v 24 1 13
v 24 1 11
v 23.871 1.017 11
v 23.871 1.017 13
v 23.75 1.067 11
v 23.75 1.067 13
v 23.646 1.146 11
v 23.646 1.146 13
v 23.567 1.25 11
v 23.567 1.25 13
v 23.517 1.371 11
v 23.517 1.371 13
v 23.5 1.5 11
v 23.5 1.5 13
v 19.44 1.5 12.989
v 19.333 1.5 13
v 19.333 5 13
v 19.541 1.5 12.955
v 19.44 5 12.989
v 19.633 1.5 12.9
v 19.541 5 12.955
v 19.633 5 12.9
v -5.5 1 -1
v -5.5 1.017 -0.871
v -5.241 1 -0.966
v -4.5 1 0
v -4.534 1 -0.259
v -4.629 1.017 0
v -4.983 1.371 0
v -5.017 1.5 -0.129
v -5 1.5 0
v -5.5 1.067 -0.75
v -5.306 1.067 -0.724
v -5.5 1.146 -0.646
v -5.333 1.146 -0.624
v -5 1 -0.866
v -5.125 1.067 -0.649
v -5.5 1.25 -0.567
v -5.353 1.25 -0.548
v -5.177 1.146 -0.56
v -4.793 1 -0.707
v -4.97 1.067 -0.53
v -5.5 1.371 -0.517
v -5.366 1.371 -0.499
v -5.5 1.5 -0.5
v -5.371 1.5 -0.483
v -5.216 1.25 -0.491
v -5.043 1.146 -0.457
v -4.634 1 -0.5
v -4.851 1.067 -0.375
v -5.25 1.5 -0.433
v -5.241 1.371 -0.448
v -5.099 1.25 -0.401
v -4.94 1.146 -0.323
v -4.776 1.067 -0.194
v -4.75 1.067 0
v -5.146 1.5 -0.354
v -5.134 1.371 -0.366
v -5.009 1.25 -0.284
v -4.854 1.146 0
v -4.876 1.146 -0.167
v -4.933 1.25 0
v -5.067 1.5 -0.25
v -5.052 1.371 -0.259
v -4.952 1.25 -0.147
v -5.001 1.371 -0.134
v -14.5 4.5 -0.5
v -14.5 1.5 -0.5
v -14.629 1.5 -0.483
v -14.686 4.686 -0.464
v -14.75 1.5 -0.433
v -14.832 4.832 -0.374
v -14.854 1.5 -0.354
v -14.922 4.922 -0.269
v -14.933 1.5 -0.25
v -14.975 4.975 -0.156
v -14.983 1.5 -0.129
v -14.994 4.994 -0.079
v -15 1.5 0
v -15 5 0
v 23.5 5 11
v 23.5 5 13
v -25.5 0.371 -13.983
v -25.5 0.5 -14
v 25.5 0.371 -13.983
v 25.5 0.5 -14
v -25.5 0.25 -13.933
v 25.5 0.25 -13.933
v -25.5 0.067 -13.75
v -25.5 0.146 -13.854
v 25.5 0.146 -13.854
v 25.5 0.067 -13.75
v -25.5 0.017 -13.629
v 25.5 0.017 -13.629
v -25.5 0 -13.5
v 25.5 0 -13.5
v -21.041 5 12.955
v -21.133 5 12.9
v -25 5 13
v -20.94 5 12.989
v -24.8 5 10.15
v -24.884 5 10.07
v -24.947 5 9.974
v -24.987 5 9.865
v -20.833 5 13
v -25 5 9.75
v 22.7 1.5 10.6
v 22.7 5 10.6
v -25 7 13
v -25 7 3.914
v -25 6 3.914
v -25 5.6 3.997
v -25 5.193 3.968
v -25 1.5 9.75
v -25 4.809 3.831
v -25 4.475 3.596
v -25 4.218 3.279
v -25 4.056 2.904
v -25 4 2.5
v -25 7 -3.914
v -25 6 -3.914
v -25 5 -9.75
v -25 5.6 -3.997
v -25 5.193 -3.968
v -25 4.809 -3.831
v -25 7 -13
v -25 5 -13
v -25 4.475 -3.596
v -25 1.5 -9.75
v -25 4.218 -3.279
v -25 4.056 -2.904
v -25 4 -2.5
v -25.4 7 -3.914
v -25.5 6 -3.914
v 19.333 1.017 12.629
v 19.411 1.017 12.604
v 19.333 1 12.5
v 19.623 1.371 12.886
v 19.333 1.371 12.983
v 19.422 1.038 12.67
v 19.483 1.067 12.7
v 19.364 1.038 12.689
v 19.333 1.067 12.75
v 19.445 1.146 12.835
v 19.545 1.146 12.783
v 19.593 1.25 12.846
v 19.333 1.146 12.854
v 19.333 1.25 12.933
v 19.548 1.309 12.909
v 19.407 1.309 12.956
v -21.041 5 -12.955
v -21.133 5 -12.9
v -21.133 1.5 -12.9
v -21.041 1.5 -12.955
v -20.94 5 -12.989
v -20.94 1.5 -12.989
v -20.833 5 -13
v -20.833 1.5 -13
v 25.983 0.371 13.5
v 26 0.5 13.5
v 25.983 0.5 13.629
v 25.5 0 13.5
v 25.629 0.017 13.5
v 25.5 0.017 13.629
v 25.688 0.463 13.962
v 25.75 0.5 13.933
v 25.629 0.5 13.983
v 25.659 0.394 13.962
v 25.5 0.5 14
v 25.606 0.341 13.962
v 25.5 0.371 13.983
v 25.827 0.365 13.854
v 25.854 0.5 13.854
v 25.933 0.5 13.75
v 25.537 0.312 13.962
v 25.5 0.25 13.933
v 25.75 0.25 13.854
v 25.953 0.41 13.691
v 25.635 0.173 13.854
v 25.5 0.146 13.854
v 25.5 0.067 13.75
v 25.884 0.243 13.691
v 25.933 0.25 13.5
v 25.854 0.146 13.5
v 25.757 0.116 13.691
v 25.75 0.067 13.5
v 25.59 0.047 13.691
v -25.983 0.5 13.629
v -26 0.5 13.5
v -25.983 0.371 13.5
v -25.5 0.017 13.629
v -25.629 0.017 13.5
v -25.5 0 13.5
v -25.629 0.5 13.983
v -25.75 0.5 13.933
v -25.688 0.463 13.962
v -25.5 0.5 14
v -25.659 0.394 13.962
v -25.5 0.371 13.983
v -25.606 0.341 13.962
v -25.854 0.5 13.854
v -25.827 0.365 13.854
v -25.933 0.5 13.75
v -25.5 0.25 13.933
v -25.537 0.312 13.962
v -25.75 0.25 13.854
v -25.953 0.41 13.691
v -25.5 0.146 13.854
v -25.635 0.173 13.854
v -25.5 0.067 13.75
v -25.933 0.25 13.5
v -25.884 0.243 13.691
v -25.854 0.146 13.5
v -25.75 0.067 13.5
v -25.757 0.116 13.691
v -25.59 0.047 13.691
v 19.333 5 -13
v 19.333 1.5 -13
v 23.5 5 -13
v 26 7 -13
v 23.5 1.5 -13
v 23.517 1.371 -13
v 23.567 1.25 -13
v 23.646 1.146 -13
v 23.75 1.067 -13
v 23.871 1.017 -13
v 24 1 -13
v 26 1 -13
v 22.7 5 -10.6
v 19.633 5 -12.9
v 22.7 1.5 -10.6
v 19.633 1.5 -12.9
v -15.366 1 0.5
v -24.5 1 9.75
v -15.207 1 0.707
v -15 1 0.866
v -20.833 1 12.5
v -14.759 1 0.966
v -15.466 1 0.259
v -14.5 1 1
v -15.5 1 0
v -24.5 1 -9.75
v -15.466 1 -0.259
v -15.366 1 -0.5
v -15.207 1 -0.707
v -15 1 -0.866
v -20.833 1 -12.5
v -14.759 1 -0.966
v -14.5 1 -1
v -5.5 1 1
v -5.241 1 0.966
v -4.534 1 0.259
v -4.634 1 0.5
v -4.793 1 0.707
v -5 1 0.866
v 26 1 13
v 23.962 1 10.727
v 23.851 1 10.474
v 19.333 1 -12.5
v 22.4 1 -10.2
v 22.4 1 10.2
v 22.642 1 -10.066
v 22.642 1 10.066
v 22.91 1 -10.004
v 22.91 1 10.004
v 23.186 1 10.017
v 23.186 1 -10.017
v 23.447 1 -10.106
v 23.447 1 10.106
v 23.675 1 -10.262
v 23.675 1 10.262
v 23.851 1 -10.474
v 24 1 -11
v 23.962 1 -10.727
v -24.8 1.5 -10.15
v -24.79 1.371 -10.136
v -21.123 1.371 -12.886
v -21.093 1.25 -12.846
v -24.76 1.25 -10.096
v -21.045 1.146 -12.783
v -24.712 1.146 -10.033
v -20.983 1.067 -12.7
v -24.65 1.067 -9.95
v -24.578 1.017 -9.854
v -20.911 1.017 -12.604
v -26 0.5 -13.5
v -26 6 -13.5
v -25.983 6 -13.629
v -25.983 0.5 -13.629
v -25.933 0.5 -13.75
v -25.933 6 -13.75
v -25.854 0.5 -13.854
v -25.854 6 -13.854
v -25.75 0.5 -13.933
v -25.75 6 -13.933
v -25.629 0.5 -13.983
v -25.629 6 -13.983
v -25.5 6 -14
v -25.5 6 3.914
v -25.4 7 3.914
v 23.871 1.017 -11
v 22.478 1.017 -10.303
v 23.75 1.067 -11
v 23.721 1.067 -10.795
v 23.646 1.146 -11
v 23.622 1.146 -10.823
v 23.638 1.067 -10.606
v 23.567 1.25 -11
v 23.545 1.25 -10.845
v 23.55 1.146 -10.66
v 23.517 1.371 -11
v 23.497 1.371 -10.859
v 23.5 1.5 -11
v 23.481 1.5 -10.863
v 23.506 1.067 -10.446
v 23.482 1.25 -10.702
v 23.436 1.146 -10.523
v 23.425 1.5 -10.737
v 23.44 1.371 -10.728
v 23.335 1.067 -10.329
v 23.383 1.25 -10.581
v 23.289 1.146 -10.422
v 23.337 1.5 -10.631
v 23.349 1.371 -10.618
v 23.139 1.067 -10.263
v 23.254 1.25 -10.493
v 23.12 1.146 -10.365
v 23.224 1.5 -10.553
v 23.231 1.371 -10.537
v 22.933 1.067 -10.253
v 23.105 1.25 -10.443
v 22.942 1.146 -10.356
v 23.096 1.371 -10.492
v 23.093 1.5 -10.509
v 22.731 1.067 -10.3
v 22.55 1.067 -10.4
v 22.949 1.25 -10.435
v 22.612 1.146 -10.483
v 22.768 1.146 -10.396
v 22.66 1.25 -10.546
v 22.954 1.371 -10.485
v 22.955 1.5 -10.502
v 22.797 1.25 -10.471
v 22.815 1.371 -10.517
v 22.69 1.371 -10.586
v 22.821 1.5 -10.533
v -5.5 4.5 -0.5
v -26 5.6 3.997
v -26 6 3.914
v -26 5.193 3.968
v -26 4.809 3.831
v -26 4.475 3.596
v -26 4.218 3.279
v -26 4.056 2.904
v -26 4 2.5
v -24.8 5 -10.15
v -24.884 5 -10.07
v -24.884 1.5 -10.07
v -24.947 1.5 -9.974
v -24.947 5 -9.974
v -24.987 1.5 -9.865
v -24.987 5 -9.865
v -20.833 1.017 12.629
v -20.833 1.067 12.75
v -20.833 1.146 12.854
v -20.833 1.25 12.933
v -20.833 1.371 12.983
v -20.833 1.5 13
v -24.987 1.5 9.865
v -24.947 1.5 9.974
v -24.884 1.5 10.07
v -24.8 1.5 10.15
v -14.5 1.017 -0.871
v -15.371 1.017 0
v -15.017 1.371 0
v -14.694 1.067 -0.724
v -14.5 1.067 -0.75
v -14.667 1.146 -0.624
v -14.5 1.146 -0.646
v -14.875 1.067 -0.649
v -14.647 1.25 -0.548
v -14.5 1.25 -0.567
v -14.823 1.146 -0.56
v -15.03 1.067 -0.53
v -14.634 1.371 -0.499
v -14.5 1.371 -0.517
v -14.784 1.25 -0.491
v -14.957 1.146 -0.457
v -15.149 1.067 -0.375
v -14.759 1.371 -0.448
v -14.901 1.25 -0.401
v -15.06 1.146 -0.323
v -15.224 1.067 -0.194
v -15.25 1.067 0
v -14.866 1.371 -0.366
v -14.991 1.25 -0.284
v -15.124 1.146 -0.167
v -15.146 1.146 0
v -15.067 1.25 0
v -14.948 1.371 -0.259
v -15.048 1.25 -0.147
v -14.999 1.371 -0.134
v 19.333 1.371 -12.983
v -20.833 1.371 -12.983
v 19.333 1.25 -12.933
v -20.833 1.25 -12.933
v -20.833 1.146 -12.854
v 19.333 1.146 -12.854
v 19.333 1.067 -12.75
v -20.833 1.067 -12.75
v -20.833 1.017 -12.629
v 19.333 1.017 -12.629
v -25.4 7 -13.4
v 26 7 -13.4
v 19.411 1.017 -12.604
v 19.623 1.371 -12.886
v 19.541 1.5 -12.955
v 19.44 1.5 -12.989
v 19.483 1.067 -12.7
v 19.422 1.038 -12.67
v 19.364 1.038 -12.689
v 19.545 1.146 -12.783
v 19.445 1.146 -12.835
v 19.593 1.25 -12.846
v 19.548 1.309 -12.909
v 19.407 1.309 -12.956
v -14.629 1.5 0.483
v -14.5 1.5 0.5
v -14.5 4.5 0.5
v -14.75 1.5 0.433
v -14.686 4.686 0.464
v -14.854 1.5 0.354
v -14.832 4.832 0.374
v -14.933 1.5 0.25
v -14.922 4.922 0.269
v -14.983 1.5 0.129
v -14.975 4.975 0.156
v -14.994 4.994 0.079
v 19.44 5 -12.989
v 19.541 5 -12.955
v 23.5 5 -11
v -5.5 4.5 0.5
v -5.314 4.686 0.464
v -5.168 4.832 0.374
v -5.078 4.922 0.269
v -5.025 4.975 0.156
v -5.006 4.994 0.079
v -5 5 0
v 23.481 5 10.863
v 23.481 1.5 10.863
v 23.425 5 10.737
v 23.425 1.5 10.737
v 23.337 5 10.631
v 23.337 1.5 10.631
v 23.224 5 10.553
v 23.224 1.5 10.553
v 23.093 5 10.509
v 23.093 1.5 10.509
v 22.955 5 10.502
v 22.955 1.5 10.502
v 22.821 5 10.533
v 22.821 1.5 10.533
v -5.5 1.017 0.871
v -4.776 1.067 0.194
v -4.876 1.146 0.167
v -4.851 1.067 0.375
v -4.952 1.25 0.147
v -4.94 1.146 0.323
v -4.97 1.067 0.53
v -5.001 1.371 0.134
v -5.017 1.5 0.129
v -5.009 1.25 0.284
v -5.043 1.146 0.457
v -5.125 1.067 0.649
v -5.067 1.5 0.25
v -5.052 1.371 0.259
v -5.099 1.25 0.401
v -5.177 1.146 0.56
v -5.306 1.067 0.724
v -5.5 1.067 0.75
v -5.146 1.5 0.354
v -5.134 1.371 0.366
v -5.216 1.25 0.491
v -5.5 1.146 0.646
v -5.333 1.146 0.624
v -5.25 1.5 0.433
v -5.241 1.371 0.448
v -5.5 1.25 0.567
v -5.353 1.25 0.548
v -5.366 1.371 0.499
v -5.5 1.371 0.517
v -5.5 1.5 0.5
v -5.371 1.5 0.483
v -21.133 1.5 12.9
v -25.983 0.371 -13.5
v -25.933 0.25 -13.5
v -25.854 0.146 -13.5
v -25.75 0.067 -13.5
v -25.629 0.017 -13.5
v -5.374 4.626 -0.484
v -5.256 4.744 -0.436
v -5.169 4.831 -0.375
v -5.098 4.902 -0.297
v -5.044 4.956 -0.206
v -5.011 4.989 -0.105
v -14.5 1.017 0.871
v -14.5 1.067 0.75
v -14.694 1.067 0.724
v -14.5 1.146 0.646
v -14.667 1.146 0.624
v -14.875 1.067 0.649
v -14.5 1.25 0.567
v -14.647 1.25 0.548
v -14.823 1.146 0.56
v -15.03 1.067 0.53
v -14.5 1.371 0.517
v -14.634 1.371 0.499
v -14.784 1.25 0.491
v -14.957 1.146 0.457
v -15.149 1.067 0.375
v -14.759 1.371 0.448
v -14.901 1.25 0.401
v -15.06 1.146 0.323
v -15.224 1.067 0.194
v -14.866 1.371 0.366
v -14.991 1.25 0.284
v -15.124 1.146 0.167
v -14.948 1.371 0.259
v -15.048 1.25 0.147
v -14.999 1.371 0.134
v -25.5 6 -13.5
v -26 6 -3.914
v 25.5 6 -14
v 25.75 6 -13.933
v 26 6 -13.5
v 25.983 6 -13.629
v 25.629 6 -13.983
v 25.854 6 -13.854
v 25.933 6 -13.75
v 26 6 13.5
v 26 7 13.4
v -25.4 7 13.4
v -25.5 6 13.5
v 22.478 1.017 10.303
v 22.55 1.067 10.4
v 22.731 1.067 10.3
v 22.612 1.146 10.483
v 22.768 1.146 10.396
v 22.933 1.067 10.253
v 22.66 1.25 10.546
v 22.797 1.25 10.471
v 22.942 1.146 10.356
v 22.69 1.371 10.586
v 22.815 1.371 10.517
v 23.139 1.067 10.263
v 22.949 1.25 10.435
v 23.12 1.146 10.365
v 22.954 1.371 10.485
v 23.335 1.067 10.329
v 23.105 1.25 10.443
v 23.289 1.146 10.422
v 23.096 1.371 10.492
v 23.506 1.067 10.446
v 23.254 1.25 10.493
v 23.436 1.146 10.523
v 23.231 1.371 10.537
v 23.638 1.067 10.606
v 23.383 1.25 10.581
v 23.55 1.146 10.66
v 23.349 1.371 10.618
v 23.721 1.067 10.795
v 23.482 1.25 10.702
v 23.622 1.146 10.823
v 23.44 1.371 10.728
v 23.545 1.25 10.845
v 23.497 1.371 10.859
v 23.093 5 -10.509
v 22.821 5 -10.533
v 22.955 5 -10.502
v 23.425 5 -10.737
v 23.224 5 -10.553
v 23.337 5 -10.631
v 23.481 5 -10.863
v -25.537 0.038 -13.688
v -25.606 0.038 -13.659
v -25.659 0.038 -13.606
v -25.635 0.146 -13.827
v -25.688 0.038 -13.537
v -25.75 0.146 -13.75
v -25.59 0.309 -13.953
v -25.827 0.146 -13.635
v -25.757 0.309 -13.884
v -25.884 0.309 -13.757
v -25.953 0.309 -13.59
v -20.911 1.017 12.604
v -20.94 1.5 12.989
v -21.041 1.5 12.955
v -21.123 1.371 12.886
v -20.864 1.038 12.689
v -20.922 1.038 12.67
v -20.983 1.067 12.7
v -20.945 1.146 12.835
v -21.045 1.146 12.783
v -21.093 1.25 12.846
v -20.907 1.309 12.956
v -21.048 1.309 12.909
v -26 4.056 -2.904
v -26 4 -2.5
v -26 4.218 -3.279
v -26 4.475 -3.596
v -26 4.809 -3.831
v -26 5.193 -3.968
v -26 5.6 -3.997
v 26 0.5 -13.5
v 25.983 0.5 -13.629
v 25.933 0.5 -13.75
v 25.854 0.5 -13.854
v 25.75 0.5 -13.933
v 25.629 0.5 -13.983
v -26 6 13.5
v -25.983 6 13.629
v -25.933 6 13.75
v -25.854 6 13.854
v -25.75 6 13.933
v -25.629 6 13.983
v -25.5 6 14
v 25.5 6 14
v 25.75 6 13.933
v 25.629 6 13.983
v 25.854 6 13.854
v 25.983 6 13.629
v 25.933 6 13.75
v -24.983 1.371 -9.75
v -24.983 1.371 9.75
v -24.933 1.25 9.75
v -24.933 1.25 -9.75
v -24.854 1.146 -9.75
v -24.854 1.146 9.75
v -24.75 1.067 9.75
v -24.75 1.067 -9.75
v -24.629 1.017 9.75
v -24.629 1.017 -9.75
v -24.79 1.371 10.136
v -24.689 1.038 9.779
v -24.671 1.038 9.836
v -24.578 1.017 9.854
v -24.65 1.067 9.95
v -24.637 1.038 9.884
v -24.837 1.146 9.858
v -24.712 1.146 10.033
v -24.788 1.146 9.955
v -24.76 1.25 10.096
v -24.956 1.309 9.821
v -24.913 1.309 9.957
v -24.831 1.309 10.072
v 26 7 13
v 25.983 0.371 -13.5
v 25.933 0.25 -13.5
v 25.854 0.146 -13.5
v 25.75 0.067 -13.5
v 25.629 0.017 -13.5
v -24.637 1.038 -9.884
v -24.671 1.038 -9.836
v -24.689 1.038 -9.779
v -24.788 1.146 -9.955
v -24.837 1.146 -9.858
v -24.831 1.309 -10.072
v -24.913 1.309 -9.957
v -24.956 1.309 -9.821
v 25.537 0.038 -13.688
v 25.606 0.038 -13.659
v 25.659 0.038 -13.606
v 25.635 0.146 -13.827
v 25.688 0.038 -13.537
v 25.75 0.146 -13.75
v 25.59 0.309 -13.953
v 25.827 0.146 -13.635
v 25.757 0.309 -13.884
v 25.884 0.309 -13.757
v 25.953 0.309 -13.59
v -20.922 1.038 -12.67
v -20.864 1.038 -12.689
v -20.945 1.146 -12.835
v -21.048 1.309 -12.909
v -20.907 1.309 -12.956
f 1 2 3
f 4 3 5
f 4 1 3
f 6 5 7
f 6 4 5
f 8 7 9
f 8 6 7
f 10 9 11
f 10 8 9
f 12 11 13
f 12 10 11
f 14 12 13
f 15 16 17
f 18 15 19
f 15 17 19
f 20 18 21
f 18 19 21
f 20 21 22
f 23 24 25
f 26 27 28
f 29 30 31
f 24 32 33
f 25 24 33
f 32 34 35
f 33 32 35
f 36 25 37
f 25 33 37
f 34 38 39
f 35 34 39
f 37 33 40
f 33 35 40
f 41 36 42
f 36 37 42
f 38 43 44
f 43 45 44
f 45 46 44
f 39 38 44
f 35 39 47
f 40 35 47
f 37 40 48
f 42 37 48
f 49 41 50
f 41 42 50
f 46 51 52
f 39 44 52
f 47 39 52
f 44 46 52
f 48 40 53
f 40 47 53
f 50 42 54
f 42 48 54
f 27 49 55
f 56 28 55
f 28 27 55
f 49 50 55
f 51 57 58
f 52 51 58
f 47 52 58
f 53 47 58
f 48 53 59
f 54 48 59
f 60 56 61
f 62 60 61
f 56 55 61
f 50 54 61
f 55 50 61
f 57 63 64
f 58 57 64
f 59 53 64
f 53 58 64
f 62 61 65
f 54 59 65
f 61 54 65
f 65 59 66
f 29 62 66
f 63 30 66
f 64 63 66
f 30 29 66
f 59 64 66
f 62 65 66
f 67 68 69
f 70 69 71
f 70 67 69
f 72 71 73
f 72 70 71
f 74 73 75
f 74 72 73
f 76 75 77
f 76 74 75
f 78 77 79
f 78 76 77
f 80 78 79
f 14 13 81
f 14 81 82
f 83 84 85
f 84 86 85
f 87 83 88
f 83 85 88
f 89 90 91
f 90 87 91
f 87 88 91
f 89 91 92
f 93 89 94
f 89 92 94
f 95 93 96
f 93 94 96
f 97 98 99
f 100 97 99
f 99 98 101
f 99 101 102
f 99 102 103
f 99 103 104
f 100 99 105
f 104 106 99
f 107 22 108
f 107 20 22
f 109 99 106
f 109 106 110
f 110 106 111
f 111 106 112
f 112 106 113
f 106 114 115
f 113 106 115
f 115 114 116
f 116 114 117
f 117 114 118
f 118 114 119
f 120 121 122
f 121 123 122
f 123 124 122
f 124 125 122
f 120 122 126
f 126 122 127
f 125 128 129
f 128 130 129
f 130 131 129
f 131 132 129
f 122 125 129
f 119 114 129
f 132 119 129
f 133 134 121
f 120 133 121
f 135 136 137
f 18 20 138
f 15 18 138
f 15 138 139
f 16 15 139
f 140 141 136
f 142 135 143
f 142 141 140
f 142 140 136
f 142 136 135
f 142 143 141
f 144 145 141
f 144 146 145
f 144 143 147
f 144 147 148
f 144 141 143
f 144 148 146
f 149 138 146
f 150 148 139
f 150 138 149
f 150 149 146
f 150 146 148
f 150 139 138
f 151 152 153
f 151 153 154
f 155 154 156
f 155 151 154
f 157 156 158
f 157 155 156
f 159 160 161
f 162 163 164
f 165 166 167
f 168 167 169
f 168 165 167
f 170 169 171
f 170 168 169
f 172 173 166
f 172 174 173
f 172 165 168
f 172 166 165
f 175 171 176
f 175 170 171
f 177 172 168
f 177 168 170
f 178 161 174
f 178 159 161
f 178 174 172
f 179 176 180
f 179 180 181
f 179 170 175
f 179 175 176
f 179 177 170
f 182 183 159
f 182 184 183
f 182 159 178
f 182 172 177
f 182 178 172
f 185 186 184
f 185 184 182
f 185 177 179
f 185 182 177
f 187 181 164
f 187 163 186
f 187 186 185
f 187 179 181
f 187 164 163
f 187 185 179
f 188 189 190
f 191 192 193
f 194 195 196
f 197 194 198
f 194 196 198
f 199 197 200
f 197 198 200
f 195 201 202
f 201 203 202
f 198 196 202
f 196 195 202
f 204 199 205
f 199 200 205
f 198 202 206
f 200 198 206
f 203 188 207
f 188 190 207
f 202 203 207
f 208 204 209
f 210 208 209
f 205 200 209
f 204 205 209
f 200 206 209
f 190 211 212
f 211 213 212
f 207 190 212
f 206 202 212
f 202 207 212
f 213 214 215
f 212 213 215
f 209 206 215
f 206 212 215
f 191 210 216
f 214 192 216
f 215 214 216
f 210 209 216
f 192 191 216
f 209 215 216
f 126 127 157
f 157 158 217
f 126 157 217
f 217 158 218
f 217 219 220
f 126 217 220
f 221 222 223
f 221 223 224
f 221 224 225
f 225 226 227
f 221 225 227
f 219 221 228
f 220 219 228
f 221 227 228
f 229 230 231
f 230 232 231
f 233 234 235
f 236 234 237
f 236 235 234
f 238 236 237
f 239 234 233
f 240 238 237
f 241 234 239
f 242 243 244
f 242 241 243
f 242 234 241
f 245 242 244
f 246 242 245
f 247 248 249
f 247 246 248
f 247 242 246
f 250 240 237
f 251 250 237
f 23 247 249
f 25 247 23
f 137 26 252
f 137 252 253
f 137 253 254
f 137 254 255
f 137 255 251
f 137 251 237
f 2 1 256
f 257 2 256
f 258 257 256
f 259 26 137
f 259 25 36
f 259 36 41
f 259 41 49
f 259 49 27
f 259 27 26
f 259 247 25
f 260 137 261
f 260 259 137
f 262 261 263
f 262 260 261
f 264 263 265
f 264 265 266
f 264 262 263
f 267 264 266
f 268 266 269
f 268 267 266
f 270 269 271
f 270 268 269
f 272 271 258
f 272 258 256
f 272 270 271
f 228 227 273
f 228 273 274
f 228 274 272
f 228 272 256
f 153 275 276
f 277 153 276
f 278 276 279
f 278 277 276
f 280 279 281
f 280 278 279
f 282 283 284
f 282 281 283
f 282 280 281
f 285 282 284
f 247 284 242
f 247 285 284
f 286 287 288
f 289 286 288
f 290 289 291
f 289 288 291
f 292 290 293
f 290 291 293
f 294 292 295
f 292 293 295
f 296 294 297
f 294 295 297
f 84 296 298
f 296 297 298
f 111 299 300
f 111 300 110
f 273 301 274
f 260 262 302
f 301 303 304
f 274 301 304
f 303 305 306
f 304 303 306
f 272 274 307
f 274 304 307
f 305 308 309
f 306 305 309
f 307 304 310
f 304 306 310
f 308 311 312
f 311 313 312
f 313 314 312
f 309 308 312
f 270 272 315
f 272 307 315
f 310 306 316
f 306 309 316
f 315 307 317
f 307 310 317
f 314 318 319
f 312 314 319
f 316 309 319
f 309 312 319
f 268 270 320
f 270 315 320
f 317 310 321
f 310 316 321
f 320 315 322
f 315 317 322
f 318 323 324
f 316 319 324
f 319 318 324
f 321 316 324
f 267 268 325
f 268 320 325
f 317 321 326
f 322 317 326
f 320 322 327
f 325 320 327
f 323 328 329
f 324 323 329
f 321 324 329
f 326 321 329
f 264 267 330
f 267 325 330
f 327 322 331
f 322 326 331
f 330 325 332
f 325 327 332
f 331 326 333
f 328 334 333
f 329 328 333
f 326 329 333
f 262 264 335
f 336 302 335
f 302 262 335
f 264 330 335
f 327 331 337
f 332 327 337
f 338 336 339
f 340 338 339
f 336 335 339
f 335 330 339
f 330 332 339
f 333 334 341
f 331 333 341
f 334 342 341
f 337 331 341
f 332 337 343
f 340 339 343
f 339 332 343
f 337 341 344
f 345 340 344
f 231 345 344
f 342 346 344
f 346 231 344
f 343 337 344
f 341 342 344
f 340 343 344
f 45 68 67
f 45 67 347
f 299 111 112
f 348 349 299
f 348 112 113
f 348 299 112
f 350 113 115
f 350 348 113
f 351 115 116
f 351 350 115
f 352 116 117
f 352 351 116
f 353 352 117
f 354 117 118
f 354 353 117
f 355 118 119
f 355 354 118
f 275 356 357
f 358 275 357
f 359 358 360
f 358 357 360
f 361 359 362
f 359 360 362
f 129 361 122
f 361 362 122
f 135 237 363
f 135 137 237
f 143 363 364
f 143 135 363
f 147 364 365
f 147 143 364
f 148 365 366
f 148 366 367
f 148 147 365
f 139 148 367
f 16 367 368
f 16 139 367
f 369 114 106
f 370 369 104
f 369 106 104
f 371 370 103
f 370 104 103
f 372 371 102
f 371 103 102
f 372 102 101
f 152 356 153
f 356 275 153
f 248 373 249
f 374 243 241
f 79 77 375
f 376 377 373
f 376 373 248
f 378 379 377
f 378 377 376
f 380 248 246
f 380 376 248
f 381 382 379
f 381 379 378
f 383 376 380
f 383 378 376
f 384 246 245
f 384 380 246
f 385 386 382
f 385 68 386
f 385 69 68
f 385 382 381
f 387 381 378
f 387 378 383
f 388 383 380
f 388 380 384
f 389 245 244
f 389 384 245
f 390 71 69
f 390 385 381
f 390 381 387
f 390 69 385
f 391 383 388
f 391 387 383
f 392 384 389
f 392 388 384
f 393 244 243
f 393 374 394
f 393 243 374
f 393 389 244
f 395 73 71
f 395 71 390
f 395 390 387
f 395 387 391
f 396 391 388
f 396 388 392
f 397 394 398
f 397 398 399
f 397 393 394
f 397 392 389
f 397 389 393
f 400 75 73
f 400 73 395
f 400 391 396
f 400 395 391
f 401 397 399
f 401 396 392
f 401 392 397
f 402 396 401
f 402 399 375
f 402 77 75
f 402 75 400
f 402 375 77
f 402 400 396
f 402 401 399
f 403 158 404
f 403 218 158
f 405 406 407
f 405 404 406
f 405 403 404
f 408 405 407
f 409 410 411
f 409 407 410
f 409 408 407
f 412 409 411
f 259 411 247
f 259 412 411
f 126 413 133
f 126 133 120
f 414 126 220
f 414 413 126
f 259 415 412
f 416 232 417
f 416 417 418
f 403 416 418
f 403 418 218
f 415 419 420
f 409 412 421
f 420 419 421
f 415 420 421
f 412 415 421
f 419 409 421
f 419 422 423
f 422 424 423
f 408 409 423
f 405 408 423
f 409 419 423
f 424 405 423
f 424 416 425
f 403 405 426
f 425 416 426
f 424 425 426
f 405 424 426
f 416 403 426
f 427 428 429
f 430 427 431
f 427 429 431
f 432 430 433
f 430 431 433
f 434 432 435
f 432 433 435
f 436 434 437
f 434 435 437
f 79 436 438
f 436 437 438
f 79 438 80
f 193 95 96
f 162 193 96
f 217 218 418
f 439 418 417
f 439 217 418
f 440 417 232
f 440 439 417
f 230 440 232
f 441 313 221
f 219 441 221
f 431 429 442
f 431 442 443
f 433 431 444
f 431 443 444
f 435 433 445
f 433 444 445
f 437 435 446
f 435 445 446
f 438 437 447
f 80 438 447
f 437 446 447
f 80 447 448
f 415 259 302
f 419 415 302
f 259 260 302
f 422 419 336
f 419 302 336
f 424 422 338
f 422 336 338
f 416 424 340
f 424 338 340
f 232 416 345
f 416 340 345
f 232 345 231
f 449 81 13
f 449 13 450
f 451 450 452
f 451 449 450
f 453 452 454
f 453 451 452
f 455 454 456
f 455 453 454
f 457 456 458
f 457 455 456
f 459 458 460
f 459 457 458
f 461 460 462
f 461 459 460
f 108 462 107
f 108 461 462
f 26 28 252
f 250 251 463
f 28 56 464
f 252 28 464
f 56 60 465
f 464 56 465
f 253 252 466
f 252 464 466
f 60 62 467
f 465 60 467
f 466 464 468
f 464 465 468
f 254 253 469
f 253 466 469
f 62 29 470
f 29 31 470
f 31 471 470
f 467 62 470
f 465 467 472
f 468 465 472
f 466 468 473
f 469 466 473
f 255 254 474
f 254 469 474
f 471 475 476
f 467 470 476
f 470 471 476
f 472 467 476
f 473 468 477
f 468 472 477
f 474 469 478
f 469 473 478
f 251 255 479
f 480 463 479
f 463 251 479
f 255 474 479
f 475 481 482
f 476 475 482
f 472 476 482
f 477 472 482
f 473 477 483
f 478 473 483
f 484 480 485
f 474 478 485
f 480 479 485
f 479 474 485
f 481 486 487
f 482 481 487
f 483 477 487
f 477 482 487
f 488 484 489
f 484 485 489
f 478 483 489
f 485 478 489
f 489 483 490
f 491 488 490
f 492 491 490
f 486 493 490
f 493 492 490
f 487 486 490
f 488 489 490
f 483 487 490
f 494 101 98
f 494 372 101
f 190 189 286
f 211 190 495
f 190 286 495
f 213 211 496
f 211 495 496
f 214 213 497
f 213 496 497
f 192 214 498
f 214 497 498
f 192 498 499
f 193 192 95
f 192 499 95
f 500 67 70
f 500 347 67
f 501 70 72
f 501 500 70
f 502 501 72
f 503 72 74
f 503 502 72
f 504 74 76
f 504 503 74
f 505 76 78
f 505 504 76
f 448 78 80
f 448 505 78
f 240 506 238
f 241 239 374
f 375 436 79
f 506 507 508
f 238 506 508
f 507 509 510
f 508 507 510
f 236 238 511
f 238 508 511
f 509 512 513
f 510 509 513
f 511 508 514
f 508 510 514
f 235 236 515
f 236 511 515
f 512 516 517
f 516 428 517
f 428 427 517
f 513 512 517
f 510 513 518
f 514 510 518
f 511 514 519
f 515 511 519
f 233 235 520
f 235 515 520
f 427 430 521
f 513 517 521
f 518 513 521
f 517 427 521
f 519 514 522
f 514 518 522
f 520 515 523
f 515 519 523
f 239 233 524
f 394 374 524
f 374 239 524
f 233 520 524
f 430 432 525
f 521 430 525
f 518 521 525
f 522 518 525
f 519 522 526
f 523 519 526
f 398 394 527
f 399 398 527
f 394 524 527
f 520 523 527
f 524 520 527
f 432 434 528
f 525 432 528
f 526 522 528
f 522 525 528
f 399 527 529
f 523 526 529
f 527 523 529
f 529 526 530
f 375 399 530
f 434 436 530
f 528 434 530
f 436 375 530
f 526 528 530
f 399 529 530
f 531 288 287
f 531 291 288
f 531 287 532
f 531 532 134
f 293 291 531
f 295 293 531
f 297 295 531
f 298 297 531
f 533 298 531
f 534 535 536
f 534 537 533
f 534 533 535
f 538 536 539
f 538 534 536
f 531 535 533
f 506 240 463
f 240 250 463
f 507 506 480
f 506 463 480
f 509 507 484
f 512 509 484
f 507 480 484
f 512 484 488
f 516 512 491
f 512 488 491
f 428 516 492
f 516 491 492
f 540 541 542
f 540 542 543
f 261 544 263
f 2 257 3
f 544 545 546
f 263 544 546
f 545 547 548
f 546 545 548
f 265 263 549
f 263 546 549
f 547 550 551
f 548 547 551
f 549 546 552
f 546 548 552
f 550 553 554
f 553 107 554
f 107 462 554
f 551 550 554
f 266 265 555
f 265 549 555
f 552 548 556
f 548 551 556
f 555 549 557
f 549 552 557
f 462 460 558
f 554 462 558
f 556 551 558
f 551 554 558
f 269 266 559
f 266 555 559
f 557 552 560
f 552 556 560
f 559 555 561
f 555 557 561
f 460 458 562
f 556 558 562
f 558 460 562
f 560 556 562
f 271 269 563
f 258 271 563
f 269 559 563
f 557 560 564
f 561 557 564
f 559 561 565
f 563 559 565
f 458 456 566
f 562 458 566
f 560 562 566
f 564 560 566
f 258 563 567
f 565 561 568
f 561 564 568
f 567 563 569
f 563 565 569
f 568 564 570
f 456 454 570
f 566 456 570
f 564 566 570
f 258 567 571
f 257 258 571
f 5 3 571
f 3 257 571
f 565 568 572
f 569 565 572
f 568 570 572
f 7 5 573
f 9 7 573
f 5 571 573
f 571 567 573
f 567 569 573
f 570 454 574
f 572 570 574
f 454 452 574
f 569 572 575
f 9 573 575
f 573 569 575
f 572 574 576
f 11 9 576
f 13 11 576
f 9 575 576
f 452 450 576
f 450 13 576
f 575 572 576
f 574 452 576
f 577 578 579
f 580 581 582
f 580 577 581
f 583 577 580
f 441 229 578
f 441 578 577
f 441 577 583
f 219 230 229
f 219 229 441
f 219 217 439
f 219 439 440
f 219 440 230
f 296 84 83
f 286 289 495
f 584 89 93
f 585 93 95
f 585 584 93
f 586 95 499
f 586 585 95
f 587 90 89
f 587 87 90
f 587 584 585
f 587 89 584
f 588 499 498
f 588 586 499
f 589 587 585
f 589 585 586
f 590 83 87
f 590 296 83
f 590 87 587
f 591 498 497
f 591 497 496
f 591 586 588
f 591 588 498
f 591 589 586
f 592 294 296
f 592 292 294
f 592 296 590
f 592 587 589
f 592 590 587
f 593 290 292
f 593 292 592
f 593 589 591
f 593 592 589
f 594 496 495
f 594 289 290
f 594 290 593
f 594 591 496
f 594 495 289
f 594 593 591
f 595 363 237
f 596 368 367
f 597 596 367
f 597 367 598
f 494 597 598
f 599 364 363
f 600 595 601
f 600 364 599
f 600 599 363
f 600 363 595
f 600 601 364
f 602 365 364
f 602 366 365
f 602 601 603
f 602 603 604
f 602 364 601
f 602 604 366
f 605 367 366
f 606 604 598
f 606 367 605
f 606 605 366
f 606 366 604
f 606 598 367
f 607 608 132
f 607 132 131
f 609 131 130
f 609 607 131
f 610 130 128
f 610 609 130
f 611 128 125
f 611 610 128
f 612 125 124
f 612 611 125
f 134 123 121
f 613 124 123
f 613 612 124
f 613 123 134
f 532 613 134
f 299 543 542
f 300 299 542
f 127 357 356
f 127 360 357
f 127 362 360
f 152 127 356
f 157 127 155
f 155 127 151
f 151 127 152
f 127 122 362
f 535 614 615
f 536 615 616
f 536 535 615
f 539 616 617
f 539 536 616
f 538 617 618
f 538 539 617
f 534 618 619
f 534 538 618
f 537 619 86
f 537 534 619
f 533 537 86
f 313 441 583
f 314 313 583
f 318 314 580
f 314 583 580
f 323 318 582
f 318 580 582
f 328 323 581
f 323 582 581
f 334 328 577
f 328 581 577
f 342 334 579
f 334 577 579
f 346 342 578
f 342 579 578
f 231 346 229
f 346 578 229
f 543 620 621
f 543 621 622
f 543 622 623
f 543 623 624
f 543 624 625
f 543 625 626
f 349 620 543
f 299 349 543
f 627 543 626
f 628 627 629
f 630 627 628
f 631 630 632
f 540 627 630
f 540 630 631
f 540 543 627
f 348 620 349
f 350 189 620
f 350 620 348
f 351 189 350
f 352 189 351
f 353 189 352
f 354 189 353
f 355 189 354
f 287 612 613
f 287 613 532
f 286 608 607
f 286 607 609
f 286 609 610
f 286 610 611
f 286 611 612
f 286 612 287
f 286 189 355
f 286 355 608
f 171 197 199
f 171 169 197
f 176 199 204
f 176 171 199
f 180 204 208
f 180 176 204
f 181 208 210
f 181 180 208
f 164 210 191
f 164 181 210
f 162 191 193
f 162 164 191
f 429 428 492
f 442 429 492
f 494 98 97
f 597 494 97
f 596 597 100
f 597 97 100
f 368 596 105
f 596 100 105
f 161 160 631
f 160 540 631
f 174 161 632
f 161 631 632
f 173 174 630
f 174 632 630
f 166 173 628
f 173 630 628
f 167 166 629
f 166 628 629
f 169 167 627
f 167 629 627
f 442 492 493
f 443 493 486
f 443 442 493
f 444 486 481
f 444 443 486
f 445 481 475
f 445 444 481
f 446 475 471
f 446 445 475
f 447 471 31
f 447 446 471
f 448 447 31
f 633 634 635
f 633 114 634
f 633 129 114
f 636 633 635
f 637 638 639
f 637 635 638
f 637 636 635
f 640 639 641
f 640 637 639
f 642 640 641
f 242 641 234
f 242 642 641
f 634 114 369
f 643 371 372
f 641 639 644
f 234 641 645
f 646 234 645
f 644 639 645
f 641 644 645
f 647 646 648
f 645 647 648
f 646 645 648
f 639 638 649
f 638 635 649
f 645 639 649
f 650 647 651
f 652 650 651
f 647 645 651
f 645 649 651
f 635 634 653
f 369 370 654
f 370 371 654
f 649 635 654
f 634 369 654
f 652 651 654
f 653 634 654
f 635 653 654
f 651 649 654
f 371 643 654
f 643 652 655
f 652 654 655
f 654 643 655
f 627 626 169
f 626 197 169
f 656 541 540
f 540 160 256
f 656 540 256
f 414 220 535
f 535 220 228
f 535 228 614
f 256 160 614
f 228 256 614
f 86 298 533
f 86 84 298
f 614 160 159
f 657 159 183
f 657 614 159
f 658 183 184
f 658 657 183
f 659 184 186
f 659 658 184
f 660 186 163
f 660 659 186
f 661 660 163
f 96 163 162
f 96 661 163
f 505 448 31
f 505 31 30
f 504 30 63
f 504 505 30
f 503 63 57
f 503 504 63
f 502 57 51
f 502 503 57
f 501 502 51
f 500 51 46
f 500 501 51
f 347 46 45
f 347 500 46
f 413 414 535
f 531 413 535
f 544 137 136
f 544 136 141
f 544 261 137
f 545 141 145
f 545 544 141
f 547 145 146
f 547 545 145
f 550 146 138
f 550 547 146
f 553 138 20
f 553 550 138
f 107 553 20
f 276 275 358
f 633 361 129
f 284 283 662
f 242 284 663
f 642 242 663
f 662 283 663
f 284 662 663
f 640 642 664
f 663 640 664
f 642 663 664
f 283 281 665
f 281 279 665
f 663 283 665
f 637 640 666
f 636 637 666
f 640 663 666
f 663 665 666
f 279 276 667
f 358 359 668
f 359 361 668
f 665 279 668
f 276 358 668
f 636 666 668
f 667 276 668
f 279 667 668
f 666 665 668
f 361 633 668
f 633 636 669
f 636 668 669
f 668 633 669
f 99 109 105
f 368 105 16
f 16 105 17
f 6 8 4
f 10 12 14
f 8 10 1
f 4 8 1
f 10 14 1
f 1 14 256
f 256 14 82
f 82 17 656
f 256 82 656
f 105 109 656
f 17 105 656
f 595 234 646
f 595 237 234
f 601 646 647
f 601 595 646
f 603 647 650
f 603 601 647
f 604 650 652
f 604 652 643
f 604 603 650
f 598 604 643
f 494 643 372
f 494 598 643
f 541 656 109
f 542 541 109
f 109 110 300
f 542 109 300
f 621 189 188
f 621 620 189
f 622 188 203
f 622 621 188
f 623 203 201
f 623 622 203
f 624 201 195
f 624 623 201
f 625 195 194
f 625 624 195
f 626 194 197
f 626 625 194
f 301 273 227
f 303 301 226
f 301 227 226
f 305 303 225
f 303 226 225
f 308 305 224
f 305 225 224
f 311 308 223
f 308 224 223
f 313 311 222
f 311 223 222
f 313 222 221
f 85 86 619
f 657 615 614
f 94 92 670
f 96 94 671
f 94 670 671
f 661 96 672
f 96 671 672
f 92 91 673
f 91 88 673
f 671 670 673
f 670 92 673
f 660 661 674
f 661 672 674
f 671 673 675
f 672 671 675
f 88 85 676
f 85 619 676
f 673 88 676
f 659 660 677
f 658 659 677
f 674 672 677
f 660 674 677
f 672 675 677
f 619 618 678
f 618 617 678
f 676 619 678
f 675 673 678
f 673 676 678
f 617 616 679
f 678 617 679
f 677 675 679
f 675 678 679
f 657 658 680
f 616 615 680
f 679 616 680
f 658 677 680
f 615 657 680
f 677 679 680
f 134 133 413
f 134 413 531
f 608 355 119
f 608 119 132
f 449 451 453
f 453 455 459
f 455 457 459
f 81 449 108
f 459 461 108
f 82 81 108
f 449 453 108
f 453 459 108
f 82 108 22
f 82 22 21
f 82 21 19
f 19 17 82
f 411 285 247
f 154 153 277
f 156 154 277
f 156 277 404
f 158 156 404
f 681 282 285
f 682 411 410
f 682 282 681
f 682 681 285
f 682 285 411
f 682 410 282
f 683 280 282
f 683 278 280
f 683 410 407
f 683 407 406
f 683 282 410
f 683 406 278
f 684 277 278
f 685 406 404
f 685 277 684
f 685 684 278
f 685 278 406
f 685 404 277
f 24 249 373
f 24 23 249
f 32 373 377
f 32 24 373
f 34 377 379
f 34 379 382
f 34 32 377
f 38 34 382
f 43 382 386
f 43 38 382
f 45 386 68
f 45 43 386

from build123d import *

# Parameters (mm, degrees)
SKETCH_1_W          = 52
SKETCH_1_H          = 28
EXTRUDE_1_DEPTH     = 6
SKETCH_3_W          = 51
SKETCH_3_H          = 26
CUT_EXTRUDE_1_DEPTH = 5
SKETCH_4_W          = 10
SKETCH_4_H          = 1
EXTRUDE_2_DEPTH     = 4
CUT_EXTRUDE_2_REACH = 56.185
FILLET_1_R          = 0.5
EXTRUDE_3_DEPTH     = 1
CHAMFER_1_SIZE      = 0.1
CHAMFER_1_SIZE_2    = 1


# Some blends are built 0.0001 mm under size
with BuildPart() as part:
    # Эскиз1 → Бобышка-Вытянуть1 (new body)
    with BuildSketch(Plane(origin=(0, 0, 0), x_dir=(1, 0, 0), z_dir=(0, 1, 0))):
        Rectangle(SKETCH_1_W, SKETCH_1_H)
    extrude(amount=EXTRUDE_1_DEPTH)

    # Эскиз3 → Вырез-Вытянуть1 (cut)
    with BuildSketch(Plane(origin=(0, 6, 0), x_dir=(1, 0, 0), z_dir=(0, 1, 0))):
        with Locations((0.5, 0)):
            Rectangle(SKETCH_3_W, SKETCH_3_H)
    extrude(amount=-CUT_EXTRUDE_1_DEPTH, mode=Mode.SUBTRACT)

    # Эскиз4 → Бобышка-Вытянуть2 (add)
    with BuildSketch(Plane(origin=(0, 1, 0), x_dir=(1, 0, 0), z_dir=(0, 1, 0))):
        Polygon((19.5, 13), (23.5, 10), (23.5, 13), align=None)
        Polygon((-25, 13), (-25, 10), (-21, 13), align=None)
        Polygon((-21, -13), (-25, -13), (-25, -10), align=None)
        Polygon((23.5, -13), (19.5, -13), (23.5, -10), align=None)
        with Locations((-10, 0)):
            Rectangle(SKETCH_4_W, SKETCH_4_H)
    extrude(amount=EXTRUDE_2_DEPTH)

    # Эскиз5 → Вырез-Вытянуть2 (cut, up to next)
    with BuildSketch(Plane.ZY.offset(26), mode=Mode.PRIVATE) as cut_extrude_2_sk1:
        with BuildLine():
            Line((2.5, 4), (-2.5, 4))
            ThreePointArc((-2.5, 4), (-4, 5.5), (-2.5, 7))
            Line((-2.5, 7), (2.5, 7))
            ThreePointArc((2.5, 7), (4, 5.5), (2.5, 4))
        make_face()
    cut_extrude_2_tool1 = extrude(cut_extrude_2_sk1.sketch, amount=-CUT_EXTRUDE_2_REACH, mode=Mode.PRIVATE) & part.part
    add(cut_extrude_2_tool1.solids().sort_by_distance((-26, 5.5, 0))[0], mode=Mode.SUBTRACT)

    # Скругление1
    fillet_1_edges = [part.edges().sort_by_distance(p)[0] for p in [
        (-26, 3, -14),
        (26, 3, -14),
        (0, 0, -14),
        (-26, 0, 0),
        (-26, 3, 14),
        (26, 0, 0),
        (26, 3, 14),
        (0, 0, 14),
        (-21, 3, 13),
        (-0.75, 1, 13),
        (19.5, 3, 13),
        (-23, 1, -11.5),
        (-25, 1, 0),
        (-23, 1, 11.5),
        (21.5, 1, 11.5),
        (23.5, 1, 11.5),
        (23.5, 1, -11.5),
        (21.5, 1, -11.5),
        (-0.75, 1, -13),
        (-10, 1, -0.5),
        (-5, 1, 0),
        (-10, 1, 0.5),
        (-15, 1, 0),
        (19.5, 3, -13),
        (-21, 3, -13),
        (-25, 3, -10),
        (-25, 3, 10),
        (23.5, 3, 10),
        (23.5, 3, -10),
        (-15, 3, -0.5),
        (-5, 3, -0.5),
        (-10, 5, -0.5),
        (-5, 3, 0.5),
        (-15, 3, 0.5),
        (-10, 5, 0.5),
    ]]
    fillet(fillet_1_edges, radius=FILLET_1_R - 0.0001)  # a hair under: the kernel refuses the full size

    # Эскиз6 → Бобышка-Вытянуть3 (add)
    with BuildSketch(Plane(origin=(0, 6, 0), x_dir=(1, 0, 0), z_dir=(0, 1, 0))):
        Polygon((-25.5, 3.914213562), (-25, 3.914213562), (-25, 13), (26, 13), (26, 13.5), (-25.5, 13.5), align=None)
        Polygon((-25.5, -13.5), (-25.5, -3.914213562), (-25, -3.914213562), (-25, -13), (26, -13), (26, -13.5), align=None)
    extrude(amount=EXTRUDE_3_DEPTH)

    # Фаска1
    # the kernel refuses this chamfer: 1, 0.1 mm, written as the material it takes off along each edge
    with BuildSketch(Plane(origin=(28.599522763, 7, 13.5), x_dir=(0, 0.3574851447578448, -0.9339188247794681), z_dir=(-1, 0, 0))) as chamfer_1_piece_1_section:
        Polygon((CHAMFER_1_SIZE * 0.933918824779, CHAMFER_1_SIZE * 0.357485144758), (-CHAMFER_1_SIZE_2 * 0.357485144758, CHAMFER_1_SIZE_2 * 0.933918824779), (0, 0), align=None)
    chamfer_1_piece_1 = extrude(amount=56.699045526, mode=Mode.PRIVATE)
    chamfer_1_piece_1 = split(chamfer_1_piece_1, bisect_by=Plane(origin=(0.25, 6, 13.477938847), z_dir=(0, 1, 0)), keep=Keep.TOP, mode=Mode.PRIVATE)
    add(chamfer_1_piece_1, mode=Mode.SUBTRACT)
    with BuildSketch(Plane(origin=(-25.5, 7, 16.099522763), x_dir=(-0.003827768713514726, -0.9999926740665033, 0), z_dir=(0, 0, -1))) as chamfer_1_piece_2_section:
        Polygon((CHAMFER_1_SIZE_2 * 0.999992674067, -CHAMFER_1_SIZE_2 * 0.00382776871351), (-CHAMFER_1_SIZE * 0.00382776871351, -CHAMFER_1_SIZE * 0.999992674067), (0, 0), align=None)
    chamfer_1_piece_2 = extrude(amount=14.784831964, mode=Mode.PRIVATE)
    chamfer_1_piece_2 = split(chamfer_1_piece_2, bisect_by=Plane(origin=(-25.477938847, 6, 8.707106781), z_dir=(0, 1, 0)), keep=Keep.TOP, mode=Mode.PRIVATE)
    add(chamfer_1_piece_2, mode=Mode.SUBTRACT)
    with BuildSketch(Plane(origin=(28.599522763, 7, -13.5), x_dir=(0, 0.3574851447578448, 0.9339188247794681), z_dir=(-1, 0, 0))) as chamfer_1_piece_3_section:
        Polygon((CHAMFER_1_SIZE * 0.933918824779, -CHAMFER_1_SIZE * 0.357485144758), (-CHAMFER_1_SIZE_2 * 0.357485144758, -CHAMFER_1_SIZE_2 * 0.933918824779), (0, 0), align=None)
    chamfer_1_piece_3 = extrude(amount=56.699045526, mode=Mode.PRIVATE)
    chamfer_1_piece_3 = split(chamfer_1_piece_3, bisect_by=Plane(origin=(0.25, 6, -13.477938847), z_dir=(0, 1, 0)), keep=Keep.TOP, mode=Mode.PRIVATE)
    add(chamfer_1_piece_3, mode=Mode.SUBTRACT)
    with BuildSketch(Plane(origin=(-25.5, 7, -16.099522763), x_dir=(0.9339188247794681, 0.3574851447578448, 0), z_dir=(0, 0, 1))) as chamfer_1_piece_4_section:
        Polygon((CHAMFER_1_SIZE * 0.933918824779, -CHAMFER_1_SIZE * 0.357485144758), (-CHAMFER_1_SIZE_2 * 0.357485144758, -CHAMFER_1_SIZE_2 * 0.933918824779), (0, 0), align=None)
    chamfer_1_piece_4 = extrude(amount=14.784831964, mode=Mode.PRIVATE)
    chamfer_1_piece_4 = split(chamfer_1_piece_4, bisect_by=Plane(origin=(-25.477938847, 6, -8.707106781), z_dir=(0, 1, 0)), keep=Keep.TOP, mode=Mode.PRIVATE)
    add(chamfer_1_piece_4, mode=Mode.SUBTRACT)


solid = part.part
